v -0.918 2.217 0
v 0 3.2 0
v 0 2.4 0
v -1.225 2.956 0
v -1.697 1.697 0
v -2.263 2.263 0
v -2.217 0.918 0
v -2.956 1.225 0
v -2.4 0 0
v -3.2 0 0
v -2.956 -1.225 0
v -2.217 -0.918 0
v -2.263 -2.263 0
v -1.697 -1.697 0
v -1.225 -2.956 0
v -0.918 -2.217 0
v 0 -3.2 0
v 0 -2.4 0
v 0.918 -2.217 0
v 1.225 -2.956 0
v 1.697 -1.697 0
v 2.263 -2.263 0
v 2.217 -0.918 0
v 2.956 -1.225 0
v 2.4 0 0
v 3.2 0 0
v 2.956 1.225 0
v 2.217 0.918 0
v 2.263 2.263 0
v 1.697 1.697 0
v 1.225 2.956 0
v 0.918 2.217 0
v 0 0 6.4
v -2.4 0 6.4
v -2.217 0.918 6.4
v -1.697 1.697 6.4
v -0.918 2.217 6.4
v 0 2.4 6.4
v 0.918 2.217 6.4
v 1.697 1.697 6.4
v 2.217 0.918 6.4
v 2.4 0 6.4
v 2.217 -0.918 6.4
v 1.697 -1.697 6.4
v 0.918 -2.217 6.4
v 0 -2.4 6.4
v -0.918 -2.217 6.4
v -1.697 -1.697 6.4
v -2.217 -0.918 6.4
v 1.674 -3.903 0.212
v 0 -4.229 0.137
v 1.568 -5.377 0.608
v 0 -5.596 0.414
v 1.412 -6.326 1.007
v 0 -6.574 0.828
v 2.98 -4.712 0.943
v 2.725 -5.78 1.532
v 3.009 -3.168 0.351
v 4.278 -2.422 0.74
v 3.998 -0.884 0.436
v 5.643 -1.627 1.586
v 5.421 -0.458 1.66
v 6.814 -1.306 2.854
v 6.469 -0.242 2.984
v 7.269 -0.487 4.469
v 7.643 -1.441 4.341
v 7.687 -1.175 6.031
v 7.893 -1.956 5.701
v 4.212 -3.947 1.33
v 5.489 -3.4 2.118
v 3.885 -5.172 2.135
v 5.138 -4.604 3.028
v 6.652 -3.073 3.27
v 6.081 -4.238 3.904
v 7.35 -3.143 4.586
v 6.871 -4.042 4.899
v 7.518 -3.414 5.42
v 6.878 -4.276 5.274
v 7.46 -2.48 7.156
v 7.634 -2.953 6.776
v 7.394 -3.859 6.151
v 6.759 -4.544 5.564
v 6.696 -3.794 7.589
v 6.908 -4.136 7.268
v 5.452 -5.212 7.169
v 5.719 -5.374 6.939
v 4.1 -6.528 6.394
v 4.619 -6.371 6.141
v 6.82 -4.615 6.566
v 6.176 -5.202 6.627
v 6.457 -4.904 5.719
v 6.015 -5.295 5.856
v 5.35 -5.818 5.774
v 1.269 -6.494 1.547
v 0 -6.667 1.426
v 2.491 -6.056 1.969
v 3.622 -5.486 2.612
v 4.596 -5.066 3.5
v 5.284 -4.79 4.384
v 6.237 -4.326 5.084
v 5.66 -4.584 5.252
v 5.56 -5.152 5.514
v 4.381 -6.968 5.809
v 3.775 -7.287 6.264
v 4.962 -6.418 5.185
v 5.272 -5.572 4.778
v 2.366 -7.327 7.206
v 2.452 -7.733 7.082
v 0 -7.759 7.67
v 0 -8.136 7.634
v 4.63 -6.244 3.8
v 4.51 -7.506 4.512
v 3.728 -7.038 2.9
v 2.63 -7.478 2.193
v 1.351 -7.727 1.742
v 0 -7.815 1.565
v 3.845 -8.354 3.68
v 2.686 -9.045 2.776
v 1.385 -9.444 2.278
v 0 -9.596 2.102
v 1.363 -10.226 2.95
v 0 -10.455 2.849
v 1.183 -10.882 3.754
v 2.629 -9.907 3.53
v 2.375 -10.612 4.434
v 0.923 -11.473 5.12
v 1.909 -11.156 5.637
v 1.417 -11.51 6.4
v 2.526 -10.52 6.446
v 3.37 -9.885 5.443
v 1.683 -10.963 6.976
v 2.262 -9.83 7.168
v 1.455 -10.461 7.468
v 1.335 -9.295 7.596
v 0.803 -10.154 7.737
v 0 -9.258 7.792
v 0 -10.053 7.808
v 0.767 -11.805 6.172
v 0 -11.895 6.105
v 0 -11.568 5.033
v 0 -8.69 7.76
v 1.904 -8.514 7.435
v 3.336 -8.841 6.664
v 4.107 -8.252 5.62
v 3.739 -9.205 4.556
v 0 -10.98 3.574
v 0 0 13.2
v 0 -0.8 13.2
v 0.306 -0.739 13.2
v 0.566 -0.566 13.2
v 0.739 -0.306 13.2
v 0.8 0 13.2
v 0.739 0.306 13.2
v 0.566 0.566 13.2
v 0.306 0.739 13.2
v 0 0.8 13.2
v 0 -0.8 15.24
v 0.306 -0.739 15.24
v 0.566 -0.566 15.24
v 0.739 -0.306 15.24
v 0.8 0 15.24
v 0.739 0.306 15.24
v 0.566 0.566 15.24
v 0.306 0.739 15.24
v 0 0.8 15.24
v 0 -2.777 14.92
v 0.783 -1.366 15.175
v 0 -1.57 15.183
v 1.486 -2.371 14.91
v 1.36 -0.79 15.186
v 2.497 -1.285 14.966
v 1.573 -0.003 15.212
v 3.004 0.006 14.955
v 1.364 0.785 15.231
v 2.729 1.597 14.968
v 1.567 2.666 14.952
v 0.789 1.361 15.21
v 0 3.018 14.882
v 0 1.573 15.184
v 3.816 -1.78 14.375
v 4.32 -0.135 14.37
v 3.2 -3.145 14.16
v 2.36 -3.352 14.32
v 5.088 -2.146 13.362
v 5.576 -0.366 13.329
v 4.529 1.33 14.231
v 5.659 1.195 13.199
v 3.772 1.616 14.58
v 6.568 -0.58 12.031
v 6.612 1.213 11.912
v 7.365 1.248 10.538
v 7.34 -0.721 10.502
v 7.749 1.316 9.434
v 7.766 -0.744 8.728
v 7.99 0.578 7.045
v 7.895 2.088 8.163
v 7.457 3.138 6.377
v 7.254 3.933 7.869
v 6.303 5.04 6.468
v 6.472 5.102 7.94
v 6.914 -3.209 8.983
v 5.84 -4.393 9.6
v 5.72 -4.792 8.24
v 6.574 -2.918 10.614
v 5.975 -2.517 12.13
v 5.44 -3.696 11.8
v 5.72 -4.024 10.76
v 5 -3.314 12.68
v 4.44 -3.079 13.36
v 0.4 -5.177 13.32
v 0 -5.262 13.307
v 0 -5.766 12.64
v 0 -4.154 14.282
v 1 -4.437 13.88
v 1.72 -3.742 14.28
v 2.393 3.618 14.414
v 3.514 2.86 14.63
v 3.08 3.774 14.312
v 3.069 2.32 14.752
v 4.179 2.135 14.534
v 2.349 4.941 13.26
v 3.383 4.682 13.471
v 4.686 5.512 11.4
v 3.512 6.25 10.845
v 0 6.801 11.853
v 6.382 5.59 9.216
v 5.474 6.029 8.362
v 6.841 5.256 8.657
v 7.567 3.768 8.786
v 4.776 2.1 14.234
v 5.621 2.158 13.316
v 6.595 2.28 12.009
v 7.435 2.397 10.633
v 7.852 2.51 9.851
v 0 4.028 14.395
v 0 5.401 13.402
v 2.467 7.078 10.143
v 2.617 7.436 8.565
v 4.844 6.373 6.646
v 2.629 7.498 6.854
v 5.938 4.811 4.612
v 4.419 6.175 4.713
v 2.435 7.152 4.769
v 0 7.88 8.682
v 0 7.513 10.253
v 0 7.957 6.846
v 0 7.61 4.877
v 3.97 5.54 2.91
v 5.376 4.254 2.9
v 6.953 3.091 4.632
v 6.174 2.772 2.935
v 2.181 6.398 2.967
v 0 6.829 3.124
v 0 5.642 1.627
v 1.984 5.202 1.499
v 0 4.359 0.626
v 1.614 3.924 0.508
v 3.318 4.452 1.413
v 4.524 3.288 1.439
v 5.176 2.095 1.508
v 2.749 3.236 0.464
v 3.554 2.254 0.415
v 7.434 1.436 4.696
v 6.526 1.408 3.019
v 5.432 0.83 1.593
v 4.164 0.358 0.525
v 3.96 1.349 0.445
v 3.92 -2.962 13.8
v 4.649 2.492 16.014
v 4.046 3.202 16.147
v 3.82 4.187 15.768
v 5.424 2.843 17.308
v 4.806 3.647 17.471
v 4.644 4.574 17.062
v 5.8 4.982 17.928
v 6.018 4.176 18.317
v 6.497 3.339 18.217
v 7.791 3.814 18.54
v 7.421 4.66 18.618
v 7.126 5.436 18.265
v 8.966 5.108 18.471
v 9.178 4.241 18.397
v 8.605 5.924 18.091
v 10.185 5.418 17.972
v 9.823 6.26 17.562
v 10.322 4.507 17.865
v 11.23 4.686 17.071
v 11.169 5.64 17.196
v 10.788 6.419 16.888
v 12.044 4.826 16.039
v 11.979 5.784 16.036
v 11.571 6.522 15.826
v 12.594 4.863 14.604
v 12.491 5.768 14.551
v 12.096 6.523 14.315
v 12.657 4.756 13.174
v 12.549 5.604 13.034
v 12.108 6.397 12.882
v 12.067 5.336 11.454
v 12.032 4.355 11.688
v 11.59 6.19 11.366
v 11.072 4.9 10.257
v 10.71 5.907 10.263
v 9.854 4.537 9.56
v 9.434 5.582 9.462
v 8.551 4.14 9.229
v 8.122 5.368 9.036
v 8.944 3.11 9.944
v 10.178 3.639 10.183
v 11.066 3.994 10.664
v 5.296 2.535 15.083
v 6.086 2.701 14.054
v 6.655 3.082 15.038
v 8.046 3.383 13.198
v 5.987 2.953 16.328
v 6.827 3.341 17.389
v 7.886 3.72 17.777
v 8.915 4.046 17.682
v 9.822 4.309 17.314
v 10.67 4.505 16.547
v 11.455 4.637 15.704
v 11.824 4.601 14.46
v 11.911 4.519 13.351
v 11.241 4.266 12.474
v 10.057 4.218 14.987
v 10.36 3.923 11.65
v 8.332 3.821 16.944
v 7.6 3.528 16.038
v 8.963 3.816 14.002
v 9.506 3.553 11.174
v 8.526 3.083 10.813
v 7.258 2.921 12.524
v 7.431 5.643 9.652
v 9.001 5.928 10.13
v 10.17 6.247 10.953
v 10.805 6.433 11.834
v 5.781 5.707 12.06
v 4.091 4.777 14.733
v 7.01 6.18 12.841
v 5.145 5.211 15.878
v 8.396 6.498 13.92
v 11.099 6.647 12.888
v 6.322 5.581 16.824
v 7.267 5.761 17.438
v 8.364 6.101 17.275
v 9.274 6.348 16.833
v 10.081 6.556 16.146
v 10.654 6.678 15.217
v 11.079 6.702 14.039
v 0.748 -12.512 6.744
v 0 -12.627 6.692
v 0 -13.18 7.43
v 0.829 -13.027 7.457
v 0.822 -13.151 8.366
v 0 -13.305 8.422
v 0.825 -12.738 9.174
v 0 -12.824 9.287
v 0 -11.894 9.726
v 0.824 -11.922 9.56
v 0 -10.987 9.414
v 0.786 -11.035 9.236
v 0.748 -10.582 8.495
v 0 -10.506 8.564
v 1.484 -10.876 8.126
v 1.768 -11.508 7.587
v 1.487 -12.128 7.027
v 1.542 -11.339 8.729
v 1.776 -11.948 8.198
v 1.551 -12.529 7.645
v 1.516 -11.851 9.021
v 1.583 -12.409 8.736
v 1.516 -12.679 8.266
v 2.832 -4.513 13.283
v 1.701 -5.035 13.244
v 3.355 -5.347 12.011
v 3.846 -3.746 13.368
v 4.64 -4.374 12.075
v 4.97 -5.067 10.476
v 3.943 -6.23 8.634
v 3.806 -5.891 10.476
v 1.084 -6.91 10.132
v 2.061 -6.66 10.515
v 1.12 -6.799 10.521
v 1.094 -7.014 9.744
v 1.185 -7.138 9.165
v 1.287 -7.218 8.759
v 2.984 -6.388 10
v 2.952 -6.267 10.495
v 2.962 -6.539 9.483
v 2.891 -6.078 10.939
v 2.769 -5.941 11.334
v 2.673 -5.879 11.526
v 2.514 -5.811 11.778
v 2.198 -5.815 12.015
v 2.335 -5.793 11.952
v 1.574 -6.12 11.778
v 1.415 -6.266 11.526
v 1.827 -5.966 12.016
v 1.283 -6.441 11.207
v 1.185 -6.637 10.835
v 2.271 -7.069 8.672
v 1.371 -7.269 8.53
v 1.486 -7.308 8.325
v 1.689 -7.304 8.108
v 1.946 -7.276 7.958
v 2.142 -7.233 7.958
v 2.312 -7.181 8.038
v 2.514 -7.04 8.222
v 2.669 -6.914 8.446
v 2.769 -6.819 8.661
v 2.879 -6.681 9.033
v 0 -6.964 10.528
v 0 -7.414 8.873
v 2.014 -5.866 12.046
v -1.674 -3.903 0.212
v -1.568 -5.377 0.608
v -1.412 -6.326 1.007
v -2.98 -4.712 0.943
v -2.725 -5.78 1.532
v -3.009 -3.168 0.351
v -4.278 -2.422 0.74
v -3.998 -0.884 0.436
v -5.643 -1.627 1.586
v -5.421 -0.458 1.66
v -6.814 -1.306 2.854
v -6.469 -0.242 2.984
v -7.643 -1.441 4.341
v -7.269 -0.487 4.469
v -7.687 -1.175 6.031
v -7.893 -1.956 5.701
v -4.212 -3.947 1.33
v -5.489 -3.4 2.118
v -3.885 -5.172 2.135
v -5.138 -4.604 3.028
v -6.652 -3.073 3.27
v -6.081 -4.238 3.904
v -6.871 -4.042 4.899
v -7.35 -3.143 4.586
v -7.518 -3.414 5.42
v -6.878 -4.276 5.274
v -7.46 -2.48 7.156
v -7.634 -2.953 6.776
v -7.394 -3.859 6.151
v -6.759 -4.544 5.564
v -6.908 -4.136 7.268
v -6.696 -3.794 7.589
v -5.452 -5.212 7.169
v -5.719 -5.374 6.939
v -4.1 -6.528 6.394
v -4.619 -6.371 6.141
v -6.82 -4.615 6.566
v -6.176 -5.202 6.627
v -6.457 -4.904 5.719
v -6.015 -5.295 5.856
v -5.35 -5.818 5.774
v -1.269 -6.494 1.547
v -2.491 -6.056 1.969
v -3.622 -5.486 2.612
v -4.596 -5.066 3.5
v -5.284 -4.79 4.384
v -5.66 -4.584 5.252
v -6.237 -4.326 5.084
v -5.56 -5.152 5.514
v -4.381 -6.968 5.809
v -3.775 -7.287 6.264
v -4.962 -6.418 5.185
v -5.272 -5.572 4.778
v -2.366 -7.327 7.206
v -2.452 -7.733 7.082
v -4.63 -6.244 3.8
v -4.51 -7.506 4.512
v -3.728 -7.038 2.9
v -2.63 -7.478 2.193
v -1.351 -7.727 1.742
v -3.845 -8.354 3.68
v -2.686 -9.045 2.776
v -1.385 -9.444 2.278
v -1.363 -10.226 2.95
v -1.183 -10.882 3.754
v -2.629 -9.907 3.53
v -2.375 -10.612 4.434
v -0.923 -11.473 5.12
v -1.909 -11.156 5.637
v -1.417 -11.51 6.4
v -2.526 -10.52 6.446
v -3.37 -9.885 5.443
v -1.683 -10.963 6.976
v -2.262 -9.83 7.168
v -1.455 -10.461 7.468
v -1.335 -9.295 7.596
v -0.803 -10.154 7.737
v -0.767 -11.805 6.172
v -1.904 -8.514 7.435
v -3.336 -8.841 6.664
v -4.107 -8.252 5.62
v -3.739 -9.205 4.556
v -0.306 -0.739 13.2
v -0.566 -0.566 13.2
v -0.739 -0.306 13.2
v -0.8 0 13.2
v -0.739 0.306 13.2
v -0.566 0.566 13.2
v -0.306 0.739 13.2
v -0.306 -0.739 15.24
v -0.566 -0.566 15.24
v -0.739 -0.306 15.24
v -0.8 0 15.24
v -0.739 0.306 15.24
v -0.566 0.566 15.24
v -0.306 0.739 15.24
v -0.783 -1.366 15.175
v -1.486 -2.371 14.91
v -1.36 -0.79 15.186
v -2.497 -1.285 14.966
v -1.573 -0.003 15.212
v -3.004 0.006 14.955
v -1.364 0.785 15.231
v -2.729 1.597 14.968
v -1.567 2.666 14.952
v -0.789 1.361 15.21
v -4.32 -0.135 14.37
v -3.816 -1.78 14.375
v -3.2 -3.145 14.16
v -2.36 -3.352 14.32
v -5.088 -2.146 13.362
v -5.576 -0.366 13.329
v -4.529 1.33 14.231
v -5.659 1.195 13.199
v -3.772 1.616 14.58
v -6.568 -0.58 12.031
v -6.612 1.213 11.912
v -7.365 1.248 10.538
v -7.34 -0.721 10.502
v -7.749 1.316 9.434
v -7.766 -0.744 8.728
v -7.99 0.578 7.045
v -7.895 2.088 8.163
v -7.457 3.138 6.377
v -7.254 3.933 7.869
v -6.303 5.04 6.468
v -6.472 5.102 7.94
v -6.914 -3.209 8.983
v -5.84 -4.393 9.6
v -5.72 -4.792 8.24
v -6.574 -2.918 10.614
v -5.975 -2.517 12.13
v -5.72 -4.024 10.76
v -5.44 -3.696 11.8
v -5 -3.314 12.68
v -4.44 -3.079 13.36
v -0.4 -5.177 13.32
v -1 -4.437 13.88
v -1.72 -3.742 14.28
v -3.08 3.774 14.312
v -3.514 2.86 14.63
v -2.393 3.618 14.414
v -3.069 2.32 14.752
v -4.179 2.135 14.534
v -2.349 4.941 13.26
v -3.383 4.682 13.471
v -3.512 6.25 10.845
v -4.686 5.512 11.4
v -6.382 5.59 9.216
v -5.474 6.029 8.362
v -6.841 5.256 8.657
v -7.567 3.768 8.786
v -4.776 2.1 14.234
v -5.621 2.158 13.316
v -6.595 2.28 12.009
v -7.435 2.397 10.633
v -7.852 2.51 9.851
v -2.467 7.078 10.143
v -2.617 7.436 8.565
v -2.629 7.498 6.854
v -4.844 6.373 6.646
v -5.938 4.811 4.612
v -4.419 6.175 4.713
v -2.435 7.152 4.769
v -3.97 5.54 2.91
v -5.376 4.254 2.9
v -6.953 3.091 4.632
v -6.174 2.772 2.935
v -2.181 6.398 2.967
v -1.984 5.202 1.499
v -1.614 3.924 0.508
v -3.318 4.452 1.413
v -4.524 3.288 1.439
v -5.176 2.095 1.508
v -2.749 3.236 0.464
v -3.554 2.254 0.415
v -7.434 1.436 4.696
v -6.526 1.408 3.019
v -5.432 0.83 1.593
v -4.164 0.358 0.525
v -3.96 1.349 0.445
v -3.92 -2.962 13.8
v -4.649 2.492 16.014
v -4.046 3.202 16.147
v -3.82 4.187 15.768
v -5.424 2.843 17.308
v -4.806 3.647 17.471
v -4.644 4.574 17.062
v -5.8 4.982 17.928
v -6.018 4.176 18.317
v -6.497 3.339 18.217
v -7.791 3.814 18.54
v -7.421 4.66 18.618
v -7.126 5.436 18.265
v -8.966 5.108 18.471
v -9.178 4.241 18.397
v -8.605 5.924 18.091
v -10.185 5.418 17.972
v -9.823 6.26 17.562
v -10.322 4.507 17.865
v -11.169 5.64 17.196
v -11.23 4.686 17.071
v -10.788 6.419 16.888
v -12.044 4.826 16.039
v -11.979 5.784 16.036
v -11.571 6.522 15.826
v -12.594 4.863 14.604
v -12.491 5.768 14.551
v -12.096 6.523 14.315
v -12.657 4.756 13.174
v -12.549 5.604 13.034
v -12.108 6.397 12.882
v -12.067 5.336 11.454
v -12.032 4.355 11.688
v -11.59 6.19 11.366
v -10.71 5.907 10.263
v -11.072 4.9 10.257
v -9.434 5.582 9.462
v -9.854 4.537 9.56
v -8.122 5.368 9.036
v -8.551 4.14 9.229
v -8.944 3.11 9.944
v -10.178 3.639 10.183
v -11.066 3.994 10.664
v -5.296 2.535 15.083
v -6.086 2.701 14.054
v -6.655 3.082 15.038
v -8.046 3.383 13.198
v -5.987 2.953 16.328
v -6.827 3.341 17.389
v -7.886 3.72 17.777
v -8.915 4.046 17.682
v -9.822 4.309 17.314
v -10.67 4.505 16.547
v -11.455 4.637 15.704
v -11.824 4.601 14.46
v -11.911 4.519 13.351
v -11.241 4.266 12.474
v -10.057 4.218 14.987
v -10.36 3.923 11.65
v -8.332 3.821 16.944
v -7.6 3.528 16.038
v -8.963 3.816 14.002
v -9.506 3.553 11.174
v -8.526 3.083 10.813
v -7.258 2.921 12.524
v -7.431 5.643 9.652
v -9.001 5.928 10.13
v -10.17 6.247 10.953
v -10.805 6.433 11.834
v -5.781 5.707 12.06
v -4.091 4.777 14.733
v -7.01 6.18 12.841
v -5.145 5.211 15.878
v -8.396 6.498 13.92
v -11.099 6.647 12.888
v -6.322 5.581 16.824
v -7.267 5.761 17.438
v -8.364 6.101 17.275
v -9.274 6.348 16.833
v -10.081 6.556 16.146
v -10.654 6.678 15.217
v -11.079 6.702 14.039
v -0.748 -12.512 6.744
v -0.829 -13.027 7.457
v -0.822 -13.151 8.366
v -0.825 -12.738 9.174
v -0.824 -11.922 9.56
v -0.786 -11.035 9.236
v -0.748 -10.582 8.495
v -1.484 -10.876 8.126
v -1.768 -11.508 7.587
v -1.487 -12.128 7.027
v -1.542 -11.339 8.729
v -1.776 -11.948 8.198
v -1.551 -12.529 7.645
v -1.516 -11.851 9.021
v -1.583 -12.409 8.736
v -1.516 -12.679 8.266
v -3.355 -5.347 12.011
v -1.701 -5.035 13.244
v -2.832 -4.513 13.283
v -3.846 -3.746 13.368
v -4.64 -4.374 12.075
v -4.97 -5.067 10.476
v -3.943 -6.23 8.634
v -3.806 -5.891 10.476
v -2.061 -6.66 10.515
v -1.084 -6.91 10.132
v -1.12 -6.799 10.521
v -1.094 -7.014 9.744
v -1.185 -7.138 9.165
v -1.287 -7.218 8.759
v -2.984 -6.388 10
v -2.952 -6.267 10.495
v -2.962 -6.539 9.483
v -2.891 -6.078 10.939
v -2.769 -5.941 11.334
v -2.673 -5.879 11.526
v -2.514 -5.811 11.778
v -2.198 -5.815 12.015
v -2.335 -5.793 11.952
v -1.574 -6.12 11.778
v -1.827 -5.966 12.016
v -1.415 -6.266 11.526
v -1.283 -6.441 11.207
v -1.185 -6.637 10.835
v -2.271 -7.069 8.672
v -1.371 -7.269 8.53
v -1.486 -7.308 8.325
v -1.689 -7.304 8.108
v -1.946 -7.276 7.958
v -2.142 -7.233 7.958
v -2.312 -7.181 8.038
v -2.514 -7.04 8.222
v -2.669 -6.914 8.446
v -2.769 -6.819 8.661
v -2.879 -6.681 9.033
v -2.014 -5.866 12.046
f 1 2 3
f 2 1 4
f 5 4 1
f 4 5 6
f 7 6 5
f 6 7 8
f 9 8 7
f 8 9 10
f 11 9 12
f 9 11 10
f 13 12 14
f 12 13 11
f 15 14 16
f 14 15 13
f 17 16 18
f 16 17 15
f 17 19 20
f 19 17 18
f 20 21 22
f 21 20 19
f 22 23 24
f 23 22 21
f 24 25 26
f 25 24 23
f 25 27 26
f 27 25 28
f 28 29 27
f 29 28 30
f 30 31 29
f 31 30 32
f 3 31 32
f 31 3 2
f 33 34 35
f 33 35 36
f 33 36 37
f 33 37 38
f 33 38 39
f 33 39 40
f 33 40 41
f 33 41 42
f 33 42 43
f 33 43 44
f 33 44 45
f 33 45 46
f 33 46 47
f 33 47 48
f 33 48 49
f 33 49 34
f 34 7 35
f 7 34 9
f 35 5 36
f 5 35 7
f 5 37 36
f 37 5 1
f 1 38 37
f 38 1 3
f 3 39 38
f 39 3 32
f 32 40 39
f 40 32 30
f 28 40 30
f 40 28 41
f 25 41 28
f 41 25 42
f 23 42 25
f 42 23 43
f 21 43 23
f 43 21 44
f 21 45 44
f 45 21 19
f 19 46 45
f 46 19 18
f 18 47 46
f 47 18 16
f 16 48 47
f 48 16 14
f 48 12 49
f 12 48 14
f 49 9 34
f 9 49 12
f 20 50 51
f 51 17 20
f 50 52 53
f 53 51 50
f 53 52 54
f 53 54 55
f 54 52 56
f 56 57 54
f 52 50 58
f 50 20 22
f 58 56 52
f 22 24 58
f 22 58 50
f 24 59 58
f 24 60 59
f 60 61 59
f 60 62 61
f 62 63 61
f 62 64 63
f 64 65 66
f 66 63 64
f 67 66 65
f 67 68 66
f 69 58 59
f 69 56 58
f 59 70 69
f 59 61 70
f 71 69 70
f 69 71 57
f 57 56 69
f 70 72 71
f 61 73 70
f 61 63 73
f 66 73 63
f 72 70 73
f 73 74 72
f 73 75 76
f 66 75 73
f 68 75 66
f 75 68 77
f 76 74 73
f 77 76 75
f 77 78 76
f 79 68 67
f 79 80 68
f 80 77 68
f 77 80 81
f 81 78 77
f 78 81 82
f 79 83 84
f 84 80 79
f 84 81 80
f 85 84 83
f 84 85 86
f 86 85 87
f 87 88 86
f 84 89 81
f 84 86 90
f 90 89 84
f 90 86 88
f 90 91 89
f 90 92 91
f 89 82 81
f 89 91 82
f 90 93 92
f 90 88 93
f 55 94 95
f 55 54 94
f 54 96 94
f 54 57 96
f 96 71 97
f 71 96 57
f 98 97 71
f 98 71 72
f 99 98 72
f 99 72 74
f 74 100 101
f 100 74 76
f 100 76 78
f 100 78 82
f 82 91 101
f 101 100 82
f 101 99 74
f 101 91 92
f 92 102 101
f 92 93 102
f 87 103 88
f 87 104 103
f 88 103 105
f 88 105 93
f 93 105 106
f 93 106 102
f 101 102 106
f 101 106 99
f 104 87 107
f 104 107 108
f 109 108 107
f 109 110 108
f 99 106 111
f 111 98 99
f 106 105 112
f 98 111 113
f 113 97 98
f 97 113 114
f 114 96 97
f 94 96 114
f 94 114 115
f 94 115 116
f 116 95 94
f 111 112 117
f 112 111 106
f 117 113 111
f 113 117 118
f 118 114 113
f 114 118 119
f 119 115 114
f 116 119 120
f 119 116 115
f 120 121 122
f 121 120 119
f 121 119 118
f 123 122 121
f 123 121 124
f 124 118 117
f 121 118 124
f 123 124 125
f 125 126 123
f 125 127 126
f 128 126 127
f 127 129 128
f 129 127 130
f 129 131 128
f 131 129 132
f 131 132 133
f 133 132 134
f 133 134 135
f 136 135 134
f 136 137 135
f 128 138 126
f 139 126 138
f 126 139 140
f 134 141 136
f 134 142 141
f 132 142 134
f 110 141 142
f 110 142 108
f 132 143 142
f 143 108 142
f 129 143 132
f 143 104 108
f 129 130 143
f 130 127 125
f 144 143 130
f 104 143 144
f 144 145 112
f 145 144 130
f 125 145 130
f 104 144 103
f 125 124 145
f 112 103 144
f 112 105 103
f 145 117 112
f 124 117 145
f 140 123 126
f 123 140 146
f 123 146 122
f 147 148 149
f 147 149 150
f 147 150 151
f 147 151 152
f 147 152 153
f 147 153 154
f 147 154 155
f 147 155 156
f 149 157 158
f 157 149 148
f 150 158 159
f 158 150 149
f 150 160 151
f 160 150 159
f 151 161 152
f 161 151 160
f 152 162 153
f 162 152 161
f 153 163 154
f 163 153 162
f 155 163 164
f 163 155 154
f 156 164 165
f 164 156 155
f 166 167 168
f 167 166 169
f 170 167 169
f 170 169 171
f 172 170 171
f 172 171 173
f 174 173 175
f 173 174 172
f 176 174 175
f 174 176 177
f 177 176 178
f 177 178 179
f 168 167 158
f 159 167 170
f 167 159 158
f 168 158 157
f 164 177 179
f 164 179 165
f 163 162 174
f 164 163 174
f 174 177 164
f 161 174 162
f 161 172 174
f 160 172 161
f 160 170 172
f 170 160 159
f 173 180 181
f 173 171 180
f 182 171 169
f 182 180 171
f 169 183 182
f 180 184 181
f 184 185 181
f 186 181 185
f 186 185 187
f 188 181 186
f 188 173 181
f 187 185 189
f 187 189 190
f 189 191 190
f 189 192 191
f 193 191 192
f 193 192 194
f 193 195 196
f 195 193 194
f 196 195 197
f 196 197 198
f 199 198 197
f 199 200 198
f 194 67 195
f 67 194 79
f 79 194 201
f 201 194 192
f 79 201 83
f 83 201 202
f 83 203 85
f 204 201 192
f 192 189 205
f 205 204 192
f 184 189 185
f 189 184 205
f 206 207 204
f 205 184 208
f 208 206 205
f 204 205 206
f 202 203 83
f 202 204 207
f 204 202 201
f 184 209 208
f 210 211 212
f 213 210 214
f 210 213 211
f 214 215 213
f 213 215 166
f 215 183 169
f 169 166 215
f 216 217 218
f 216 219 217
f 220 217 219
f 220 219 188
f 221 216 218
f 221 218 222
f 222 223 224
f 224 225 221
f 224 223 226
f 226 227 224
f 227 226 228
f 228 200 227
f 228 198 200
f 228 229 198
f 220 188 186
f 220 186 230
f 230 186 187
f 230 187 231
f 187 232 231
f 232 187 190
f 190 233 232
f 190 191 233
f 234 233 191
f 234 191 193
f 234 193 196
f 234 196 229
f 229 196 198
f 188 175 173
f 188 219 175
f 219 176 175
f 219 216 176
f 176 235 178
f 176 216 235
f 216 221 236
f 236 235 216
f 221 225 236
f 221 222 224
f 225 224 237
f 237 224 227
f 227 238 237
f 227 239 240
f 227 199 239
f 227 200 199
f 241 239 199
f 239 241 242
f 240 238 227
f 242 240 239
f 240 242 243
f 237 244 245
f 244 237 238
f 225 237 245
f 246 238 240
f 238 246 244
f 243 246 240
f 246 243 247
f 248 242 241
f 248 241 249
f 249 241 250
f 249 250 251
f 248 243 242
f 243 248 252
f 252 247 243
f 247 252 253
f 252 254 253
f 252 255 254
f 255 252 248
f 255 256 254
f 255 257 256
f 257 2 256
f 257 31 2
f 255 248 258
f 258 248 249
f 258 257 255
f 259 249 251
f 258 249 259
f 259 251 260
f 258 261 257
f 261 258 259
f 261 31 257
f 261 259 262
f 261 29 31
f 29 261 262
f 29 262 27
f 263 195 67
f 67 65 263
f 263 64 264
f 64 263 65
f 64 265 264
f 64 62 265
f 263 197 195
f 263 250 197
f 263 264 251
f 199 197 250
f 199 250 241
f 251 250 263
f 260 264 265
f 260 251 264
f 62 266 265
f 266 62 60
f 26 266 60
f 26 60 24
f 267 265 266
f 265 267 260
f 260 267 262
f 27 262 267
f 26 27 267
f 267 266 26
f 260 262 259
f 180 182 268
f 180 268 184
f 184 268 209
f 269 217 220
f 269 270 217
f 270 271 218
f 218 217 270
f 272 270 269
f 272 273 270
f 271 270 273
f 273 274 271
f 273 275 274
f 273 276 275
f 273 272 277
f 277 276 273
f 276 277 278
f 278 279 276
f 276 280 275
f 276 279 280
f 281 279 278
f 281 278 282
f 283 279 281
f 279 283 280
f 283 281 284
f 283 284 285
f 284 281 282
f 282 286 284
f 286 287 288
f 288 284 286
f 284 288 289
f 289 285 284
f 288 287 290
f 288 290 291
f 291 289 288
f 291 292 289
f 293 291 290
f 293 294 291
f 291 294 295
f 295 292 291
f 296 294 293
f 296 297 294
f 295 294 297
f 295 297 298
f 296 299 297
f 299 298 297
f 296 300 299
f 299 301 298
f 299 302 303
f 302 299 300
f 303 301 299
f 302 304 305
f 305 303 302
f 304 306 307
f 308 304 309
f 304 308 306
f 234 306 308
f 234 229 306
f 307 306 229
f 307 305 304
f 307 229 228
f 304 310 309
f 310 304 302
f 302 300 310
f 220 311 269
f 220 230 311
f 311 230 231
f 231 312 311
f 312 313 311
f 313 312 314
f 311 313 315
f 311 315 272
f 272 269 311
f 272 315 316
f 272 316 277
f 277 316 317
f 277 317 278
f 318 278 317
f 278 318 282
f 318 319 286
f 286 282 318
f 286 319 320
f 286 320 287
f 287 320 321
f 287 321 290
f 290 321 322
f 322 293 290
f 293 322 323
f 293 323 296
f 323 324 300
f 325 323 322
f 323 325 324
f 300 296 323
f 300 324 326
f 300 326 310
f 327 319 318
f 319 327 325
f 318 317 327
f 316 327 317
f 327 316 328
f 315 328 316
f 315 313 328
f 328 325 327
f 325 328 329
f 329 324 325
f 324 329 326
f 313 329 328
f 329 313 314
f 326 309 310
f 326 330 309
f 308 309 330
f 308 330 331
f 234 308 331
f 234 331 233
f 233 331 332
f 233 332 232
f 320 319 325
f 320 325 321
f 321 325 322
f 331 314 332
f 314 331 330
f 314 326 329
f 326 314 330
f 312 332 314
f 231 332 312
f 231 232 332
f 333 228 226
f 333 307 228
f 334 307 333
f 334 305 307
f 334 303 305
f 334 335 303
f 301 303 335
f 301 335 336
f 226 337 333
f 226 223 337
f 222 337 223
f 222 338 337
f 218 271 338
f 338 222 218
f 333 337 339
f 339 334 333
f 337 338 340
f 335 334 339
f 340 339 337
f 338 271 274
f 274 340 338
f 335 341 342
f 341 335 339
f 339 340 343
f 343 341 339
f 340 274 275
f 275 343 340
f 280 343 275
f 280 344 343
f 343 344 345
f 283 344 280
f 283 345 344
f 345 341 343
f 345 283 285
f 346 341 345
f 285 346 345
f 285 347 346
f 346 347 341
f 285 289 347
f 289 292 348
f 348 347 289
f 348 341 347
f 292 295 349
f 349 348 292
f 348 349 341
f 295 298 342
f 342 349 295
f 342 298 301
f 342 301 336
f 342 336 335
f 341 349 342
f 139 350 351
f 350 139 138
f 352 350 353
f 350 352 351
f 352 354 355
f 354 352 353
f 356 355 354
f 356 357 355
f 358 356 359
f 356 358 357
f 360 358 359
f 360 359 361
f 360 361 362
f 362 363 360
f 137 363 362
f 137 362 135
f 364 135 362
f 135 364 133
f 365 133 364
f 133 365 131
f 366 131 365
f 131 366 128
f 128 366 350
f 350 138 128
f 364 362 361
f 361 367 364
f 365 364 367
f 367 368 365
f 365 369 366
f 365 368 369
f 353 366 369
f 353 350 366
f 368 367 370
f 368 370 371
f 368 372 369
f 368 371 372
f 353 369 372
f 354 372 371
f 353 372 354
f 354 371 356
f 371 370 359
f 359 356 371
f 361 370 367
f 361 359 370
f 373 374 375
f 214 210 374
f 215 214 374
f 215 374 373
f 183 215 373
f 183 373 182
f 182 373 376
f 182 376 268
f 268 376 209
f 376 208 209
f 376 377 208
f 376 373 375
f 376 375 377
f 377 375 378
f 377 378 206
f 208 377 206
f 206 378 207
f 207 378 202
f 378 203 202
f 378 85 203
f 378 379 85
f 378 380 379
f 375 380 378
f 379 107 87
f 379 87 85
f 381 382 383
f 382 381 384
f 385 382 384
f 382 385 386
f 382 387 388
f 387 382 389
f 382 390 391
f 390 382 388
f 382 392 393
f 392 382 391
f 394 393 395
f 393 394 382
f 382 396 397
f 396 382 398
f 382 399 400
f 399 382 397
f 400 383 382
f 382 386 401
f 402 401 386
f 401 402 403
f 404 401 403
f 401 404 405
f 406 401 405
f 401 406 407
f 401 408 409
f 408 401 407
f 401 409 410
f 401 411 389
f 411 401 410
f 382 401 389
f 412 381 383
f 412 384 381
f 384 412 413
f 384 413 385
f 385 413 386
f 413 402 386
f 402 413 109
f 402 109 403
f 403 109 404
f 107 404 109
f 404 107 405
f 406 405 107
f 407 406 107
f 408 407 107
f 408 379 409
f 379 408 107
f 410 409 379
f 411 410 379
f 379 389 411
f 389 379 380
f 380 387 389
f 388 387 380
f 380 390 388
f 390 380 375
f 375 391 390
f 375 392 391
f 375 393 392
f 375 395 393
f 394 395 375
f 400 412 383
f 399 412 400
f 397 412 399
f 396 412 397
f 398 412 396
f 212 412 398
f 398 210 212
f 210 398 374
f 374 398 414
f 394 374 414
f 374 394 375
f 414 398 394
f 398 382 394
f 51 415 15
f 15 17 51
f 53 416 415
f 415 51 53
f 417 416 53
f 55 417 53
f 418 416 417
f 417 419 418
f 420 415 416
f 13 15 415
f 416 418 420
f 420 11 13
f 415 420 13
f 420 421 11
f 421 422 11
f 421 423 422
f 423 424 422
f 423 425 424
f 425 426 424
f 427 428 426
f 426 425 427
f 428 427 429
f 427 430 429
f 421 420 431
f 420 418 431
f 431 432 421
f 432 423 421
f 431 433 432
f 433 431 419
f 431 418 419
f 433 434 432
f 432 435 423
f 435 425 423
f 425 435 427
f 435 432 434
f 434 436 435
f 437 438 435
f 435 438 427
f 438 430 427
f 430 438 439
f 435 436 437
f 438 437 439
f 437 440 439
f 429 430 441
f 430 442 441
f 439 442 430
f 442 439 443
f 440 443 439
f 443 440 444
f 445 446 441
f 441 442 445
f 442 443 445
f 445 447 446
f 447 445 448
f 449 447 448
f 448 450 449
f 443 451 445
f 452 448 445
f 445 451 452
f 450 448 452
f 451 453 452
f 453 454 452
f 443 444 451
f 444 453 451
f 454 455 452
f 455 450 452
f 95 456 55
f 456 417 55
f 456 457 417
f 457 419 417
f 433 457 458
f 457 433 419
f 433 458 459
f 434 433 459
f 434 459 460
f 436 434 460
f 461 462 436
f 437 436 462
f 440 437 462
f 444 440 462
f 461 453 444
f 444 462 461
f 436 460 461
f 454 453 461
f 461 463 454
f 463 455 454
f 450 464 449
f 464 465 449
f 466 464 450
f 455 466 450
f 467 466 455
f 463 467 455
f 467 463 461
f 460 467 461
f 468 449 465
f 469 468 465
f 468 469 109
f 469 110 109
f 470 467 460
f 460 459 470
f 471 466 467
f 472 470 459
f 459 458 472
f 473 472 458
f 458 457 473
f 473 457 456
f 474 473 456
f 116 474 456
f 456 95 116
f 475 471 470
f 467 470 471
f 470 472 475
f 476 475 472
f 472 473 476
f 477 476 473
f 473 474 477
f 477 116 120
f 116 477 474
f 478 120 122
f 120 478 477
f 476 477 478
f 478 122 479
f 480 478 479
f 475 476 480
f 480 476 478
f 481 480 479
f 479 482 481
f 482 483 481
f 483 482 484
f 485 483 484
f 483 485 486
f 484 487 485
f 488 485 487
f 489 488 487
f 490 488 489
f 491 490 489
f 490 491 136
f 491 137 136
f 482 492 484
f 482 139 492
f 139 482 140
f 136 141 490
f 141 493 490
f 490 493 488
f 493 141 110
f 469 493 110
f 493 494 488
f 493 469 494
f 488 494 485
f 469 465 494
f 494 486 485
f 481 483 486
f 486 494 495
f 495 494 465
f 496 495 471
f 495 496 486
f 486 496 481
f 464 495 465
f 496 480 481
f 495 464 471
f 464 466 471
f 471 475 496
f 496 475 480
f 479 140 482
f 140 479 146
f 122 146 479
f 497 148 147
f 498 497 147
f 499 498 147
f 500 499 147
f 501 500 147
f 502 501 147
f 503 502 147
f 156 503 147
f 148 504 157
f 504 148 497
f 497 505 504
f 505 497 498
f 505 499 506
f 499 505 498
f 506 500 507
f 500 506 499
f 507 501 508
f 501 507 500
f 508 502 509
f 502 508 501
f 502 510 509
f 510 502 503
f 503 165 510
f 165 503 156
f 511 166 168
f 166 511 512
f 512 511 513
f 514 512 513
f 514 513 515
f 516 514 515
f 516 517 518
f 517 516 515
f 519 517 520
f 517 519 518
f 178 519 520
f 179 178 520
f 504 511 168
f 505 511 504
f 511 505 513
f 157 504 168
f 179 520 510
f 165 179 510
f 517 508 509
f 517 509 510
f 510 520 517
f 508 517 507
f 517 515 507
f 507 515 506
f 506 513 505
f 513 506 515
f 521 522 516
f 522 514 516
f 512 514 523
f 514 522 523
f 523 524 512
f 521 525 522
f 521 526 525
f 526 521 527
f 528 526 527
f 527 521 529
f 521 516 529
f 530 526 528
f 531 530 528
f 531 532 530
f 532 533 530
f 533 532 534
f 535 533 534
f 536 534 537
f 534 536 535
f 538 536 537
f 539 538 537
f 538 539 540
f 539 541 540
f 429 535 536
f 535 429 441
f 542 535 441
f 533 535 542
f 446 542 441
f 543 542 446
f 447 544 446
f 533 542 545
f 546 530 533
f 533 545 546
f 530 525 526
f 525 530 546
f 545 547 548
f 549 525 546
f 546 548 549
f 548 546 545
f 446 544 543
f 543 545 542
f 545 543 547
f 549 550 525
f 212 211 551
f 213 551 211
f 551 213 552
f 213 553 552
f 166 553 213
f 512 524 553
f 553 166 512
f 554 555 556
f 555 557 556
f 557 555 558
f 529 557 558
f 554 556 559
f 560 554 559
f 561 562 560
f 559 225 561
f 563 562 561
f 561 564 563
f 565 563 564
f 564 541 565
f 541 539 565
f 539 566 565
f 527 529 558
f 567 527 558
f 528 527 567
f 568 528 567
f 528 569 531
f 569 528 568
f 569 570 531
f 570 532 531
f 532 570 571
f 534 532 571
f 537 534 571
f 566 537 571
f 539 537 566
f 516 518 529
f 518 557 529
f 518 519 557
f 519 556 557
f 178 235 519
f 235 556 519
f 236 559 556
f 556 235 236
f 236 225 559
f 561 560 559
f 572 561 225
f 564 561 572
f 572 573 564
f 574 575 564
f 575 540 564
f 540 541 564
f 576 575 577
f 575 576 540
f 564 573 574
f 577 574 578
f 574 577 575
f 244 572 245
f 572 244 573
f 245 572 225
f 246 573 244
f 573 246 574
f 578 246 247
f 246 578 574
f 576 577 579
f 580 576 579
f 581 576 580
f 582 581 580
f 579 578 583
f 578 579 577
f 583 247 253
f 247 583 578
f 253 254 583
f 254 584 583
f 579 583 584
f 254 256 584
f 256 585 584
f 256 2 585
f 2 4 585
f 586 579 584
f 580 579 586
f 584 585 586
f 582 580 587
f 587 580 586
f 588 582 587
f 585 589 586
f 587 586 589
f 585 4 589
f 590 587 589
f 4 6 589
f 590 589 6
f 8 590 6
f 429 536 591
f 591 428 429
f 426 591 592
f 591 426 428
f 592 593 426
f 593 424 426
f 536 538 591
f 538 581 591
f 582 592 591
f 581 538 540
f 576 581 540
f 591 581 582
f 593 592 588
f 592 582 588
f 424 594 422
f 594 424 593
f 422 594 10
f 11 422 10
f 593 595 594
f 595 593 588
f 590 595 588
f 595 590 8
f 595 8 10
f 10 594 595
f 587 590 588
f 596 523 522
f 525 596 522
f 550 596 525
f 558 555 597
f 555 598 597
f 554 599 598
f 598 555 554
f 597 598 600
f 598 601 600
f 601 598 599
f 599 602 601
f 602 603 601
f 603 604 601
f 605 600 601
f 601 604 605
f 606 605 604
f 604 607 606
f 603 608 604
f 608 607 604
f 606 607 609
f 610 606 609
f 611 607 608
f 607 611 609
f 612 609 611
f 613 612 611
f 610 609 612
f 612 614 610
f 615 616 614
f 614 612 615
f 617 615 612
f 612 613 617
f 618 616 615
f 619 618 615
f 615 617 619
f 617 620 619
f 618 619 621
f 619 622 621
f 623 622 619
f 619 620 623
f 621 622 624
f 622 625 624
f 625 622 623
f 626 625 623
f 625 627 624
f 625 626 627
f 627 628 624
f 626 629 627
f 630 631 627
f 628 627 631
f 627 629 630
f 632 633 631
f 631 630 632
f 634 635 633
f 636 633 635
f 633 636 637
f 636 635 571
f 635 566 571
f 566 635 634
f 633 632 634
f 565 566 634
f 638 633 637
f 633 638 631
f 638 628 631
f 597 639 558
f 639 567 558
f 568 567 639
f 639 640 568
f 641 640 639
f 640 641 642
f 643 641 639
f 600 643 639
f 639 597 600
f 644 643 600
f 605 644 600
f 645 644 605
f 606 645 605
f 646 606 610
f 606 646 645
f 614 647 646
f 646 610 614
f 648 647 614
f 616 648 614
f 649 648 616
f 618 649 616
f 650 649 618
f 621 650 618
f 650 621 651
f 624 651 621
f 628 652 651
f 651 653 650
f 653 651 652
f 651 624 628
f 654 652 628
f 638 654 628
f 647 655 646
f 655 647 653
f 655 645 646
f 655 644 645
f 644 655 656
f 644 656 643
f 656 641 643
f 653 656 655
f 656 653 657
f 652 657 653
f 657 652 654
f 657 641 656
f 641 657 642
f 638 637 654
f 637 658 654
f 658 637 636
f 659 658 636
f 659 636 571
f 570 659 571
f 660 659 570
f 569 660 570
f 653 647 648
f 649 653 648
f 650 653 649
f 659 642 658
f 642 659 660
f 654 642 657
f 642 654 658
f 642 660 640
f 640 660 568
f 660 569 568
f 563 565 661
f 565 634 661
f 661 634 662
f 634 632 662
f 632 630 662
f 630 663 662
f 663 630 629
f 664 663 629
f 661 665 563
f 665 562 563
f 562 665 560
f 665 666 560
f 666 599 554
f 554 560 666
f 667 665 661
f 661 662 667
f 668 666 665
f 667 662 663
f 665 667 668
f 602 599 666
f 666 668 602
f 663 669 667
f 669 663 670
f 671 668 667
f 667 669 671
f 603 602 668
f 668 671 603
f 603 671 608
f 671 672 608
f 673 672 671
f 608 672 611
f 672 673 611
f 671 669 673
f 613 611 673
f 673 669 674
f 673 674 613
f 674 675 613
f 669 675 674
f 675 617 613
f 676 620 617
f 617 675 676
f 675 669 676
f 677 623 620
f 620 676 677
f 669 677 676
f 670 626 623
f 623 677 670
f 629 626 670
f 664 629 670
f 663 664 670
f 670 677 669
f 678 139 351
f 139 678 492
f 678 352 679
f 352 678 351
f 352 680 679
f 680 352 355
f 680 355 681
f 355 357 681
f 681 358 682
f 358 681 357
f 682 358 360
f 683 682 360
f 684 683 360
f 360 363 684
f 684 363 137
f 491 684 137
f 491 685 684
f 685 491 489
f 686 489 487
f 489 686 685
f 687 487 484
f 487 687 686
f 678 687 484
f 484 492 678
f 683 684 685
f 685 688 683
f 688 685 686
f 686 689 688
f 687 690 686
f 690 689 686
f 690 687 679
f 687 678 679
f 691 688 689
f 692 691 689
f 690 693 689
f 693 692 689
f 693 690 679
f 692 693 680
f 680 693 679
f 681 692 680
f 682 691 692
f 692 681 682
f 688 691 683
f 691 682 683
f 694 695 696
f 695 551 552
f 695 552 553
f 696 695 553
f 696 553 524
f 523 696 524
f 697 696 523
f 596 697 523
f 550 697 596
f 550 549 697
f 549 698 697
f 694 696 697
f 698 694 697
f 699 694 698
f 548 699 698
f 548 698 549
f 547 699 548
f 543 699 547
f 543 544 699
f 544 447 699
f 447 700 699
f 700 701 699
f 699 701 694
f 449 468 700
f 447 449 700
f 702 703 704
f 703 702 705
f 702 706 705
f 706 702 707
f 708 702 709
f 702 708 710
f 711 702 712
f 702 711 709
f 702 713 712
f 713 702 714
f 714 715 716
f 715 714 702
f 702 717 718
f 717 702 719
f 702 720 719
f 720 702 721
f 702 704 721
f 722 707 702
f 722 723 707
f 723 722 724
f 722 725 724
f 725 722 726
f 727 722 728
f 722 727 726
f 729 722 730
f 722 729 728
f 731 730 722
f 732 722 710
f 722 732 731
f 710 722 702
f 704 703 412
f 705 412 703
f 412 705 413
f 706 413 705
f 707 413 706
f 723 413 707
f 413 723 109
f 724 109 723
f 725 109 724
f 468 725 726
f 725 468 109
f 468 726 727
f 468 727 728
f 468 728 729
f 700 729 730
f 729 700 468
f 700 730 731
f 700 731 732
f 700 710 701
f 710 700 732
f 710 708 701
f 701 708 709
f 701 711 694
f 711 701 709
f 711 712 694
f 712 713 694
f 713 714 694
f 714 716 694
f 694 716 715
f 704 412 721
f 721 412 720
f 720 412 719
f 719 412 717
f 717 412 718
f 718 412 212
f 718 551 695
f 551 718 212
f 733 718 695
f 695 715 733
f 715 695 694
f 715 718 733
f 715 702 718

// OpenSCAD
use <../lib.scad>
use <s/24629p03s05.scad>
use <s/24629s01.scad>
use <s/24629s02.scad>
use <s/24629s03.scad>
use <s/24629s04.scad>
use <../p/stud4o.scad>
function ldraw_lib__24629p03() = [
// 0 Minifig Head Mouse with Black Ears, Nose, Skull and Eyes Pattern
// 0 Name: 24629p03.dat
// 0 Author: Philippe Hurbain [Philo]
// 0 !LDRAW_ORG Part UPDATE 2024-05
// 0 !LICENSE Licensed under CC BY 4.0 : see CAreadme.txt
// 
// 0 BFC CERTIFY CCW
  [0,"BFC","CERTIFY"],
  [0,"BFC","CCW"],
// 
// 0 !KEYWORDS Black and White, Bricklink 24629pb03, Disney, Mickey, Set 31317
// 0 !KEYWORDS Steamboat Willie, Vintage
// 
// 0 !HISTORY 2022-02-06 {LEGO Instructions App} Original part shape
// 0 !HISTORY 2022-02-07 [Philo] File preparation for LDraw Parts Tracker
// 0 !HISTORY 2024-06-30 [OrionP] Official Update 2024-05
// 
// 
// 1 16 0 -16 0 1 0 0 0 -4 0 0 0 1 stud4o.dat
  [1,16,0,-16,0,1,0,0,0,-4,0,0,0,1, ldraw_lib__stud4o()],
// 1 16 0 0 0 1 0 0 0 1 0 0 0 1 s\24629s01.dat
  [1,16,0,0,0,1,0,0,0,1,0,0,0,1, ldraw_lib__s__24629s01()],
// 1 0 0 0 0 1 0 0 0 1 0 0 0 1 s\24629s02.dat
  [1,0,0,0,0,1,0,0,0,1,0,0,0,1, ldraw_lib__s__24629s02()],
// 1 0 0 0 0 1 0 0 0 1 0 0 0 1 s\24629s03.dat
  [1,0,0,0,0,1,0,0,0,1,0,0,0,1, ldraw_lib__s__24629s03()],
// 1 0 0 0 0 1 0 0 0 1 0 0 0 1 s\24629s04.dat
  [1,0,0,0,0,1,0,0,0,1,0,0,0,1, ldraw_lib__s__24629s04()],
// 1 16 0 0 0 1 0 0 0 1 0 0 0 1 s\24629p03s05.dat
  [1,16,0,0,0,1,0,0,0,1,0,0,0,1, ldraw_lib__s__24629p03s05()],
// 1 16 0 0 0 -1 0 0 0 1 0 0 0 1 s\24629s01.dat
  [1,16,0,0,0,-1,0,0,0,1,0,0,0,1, ldraw_lib__s__24629s01()],
// 1 0 0 0 0 -1 0 0 0 1 0 0 0 1 s\24629s02.dat
  [1,0,0,0,0,-1,0,0,0,1,0,0,0,1, ldraw_lib__s__24629s02()],
// 1 0 0 0 0 -1 0 0 0 1 0 0 0 1 s\24629s03.dat
  [1,0,0,0,0,-1,0,0,0,1,0,0,0,1, ldraw_lib__s__24629s03()],
// 1 0 0 0 0 -1 0 0 0 1 0 0 0 1 s\24629s04.dat
  [1,0,0,0,0,-1,0,0,0,1,0,0,0,1, ldraw_lib__s__24629s04()],
// 1 16 0 0 0 -1 0 0 0 1 0 0 0 1 s\24629p03s05.dat
  [1,16,0,0,0,-1,0,0,0,1,0,0,0,1, ldraw_lib__s__24629p03s05()],
];
module ldraw_lib__24629p03(step=0, col=false, unit=2/5, alt=false, line=0.2, solid=!$preview)
    makepoly(ldraw_lib__24629p03(), step=step, col=col, unit=unit, alt=alt, line=line, solid=solid);
ldraw_lib__24629p03(line=0.2);
